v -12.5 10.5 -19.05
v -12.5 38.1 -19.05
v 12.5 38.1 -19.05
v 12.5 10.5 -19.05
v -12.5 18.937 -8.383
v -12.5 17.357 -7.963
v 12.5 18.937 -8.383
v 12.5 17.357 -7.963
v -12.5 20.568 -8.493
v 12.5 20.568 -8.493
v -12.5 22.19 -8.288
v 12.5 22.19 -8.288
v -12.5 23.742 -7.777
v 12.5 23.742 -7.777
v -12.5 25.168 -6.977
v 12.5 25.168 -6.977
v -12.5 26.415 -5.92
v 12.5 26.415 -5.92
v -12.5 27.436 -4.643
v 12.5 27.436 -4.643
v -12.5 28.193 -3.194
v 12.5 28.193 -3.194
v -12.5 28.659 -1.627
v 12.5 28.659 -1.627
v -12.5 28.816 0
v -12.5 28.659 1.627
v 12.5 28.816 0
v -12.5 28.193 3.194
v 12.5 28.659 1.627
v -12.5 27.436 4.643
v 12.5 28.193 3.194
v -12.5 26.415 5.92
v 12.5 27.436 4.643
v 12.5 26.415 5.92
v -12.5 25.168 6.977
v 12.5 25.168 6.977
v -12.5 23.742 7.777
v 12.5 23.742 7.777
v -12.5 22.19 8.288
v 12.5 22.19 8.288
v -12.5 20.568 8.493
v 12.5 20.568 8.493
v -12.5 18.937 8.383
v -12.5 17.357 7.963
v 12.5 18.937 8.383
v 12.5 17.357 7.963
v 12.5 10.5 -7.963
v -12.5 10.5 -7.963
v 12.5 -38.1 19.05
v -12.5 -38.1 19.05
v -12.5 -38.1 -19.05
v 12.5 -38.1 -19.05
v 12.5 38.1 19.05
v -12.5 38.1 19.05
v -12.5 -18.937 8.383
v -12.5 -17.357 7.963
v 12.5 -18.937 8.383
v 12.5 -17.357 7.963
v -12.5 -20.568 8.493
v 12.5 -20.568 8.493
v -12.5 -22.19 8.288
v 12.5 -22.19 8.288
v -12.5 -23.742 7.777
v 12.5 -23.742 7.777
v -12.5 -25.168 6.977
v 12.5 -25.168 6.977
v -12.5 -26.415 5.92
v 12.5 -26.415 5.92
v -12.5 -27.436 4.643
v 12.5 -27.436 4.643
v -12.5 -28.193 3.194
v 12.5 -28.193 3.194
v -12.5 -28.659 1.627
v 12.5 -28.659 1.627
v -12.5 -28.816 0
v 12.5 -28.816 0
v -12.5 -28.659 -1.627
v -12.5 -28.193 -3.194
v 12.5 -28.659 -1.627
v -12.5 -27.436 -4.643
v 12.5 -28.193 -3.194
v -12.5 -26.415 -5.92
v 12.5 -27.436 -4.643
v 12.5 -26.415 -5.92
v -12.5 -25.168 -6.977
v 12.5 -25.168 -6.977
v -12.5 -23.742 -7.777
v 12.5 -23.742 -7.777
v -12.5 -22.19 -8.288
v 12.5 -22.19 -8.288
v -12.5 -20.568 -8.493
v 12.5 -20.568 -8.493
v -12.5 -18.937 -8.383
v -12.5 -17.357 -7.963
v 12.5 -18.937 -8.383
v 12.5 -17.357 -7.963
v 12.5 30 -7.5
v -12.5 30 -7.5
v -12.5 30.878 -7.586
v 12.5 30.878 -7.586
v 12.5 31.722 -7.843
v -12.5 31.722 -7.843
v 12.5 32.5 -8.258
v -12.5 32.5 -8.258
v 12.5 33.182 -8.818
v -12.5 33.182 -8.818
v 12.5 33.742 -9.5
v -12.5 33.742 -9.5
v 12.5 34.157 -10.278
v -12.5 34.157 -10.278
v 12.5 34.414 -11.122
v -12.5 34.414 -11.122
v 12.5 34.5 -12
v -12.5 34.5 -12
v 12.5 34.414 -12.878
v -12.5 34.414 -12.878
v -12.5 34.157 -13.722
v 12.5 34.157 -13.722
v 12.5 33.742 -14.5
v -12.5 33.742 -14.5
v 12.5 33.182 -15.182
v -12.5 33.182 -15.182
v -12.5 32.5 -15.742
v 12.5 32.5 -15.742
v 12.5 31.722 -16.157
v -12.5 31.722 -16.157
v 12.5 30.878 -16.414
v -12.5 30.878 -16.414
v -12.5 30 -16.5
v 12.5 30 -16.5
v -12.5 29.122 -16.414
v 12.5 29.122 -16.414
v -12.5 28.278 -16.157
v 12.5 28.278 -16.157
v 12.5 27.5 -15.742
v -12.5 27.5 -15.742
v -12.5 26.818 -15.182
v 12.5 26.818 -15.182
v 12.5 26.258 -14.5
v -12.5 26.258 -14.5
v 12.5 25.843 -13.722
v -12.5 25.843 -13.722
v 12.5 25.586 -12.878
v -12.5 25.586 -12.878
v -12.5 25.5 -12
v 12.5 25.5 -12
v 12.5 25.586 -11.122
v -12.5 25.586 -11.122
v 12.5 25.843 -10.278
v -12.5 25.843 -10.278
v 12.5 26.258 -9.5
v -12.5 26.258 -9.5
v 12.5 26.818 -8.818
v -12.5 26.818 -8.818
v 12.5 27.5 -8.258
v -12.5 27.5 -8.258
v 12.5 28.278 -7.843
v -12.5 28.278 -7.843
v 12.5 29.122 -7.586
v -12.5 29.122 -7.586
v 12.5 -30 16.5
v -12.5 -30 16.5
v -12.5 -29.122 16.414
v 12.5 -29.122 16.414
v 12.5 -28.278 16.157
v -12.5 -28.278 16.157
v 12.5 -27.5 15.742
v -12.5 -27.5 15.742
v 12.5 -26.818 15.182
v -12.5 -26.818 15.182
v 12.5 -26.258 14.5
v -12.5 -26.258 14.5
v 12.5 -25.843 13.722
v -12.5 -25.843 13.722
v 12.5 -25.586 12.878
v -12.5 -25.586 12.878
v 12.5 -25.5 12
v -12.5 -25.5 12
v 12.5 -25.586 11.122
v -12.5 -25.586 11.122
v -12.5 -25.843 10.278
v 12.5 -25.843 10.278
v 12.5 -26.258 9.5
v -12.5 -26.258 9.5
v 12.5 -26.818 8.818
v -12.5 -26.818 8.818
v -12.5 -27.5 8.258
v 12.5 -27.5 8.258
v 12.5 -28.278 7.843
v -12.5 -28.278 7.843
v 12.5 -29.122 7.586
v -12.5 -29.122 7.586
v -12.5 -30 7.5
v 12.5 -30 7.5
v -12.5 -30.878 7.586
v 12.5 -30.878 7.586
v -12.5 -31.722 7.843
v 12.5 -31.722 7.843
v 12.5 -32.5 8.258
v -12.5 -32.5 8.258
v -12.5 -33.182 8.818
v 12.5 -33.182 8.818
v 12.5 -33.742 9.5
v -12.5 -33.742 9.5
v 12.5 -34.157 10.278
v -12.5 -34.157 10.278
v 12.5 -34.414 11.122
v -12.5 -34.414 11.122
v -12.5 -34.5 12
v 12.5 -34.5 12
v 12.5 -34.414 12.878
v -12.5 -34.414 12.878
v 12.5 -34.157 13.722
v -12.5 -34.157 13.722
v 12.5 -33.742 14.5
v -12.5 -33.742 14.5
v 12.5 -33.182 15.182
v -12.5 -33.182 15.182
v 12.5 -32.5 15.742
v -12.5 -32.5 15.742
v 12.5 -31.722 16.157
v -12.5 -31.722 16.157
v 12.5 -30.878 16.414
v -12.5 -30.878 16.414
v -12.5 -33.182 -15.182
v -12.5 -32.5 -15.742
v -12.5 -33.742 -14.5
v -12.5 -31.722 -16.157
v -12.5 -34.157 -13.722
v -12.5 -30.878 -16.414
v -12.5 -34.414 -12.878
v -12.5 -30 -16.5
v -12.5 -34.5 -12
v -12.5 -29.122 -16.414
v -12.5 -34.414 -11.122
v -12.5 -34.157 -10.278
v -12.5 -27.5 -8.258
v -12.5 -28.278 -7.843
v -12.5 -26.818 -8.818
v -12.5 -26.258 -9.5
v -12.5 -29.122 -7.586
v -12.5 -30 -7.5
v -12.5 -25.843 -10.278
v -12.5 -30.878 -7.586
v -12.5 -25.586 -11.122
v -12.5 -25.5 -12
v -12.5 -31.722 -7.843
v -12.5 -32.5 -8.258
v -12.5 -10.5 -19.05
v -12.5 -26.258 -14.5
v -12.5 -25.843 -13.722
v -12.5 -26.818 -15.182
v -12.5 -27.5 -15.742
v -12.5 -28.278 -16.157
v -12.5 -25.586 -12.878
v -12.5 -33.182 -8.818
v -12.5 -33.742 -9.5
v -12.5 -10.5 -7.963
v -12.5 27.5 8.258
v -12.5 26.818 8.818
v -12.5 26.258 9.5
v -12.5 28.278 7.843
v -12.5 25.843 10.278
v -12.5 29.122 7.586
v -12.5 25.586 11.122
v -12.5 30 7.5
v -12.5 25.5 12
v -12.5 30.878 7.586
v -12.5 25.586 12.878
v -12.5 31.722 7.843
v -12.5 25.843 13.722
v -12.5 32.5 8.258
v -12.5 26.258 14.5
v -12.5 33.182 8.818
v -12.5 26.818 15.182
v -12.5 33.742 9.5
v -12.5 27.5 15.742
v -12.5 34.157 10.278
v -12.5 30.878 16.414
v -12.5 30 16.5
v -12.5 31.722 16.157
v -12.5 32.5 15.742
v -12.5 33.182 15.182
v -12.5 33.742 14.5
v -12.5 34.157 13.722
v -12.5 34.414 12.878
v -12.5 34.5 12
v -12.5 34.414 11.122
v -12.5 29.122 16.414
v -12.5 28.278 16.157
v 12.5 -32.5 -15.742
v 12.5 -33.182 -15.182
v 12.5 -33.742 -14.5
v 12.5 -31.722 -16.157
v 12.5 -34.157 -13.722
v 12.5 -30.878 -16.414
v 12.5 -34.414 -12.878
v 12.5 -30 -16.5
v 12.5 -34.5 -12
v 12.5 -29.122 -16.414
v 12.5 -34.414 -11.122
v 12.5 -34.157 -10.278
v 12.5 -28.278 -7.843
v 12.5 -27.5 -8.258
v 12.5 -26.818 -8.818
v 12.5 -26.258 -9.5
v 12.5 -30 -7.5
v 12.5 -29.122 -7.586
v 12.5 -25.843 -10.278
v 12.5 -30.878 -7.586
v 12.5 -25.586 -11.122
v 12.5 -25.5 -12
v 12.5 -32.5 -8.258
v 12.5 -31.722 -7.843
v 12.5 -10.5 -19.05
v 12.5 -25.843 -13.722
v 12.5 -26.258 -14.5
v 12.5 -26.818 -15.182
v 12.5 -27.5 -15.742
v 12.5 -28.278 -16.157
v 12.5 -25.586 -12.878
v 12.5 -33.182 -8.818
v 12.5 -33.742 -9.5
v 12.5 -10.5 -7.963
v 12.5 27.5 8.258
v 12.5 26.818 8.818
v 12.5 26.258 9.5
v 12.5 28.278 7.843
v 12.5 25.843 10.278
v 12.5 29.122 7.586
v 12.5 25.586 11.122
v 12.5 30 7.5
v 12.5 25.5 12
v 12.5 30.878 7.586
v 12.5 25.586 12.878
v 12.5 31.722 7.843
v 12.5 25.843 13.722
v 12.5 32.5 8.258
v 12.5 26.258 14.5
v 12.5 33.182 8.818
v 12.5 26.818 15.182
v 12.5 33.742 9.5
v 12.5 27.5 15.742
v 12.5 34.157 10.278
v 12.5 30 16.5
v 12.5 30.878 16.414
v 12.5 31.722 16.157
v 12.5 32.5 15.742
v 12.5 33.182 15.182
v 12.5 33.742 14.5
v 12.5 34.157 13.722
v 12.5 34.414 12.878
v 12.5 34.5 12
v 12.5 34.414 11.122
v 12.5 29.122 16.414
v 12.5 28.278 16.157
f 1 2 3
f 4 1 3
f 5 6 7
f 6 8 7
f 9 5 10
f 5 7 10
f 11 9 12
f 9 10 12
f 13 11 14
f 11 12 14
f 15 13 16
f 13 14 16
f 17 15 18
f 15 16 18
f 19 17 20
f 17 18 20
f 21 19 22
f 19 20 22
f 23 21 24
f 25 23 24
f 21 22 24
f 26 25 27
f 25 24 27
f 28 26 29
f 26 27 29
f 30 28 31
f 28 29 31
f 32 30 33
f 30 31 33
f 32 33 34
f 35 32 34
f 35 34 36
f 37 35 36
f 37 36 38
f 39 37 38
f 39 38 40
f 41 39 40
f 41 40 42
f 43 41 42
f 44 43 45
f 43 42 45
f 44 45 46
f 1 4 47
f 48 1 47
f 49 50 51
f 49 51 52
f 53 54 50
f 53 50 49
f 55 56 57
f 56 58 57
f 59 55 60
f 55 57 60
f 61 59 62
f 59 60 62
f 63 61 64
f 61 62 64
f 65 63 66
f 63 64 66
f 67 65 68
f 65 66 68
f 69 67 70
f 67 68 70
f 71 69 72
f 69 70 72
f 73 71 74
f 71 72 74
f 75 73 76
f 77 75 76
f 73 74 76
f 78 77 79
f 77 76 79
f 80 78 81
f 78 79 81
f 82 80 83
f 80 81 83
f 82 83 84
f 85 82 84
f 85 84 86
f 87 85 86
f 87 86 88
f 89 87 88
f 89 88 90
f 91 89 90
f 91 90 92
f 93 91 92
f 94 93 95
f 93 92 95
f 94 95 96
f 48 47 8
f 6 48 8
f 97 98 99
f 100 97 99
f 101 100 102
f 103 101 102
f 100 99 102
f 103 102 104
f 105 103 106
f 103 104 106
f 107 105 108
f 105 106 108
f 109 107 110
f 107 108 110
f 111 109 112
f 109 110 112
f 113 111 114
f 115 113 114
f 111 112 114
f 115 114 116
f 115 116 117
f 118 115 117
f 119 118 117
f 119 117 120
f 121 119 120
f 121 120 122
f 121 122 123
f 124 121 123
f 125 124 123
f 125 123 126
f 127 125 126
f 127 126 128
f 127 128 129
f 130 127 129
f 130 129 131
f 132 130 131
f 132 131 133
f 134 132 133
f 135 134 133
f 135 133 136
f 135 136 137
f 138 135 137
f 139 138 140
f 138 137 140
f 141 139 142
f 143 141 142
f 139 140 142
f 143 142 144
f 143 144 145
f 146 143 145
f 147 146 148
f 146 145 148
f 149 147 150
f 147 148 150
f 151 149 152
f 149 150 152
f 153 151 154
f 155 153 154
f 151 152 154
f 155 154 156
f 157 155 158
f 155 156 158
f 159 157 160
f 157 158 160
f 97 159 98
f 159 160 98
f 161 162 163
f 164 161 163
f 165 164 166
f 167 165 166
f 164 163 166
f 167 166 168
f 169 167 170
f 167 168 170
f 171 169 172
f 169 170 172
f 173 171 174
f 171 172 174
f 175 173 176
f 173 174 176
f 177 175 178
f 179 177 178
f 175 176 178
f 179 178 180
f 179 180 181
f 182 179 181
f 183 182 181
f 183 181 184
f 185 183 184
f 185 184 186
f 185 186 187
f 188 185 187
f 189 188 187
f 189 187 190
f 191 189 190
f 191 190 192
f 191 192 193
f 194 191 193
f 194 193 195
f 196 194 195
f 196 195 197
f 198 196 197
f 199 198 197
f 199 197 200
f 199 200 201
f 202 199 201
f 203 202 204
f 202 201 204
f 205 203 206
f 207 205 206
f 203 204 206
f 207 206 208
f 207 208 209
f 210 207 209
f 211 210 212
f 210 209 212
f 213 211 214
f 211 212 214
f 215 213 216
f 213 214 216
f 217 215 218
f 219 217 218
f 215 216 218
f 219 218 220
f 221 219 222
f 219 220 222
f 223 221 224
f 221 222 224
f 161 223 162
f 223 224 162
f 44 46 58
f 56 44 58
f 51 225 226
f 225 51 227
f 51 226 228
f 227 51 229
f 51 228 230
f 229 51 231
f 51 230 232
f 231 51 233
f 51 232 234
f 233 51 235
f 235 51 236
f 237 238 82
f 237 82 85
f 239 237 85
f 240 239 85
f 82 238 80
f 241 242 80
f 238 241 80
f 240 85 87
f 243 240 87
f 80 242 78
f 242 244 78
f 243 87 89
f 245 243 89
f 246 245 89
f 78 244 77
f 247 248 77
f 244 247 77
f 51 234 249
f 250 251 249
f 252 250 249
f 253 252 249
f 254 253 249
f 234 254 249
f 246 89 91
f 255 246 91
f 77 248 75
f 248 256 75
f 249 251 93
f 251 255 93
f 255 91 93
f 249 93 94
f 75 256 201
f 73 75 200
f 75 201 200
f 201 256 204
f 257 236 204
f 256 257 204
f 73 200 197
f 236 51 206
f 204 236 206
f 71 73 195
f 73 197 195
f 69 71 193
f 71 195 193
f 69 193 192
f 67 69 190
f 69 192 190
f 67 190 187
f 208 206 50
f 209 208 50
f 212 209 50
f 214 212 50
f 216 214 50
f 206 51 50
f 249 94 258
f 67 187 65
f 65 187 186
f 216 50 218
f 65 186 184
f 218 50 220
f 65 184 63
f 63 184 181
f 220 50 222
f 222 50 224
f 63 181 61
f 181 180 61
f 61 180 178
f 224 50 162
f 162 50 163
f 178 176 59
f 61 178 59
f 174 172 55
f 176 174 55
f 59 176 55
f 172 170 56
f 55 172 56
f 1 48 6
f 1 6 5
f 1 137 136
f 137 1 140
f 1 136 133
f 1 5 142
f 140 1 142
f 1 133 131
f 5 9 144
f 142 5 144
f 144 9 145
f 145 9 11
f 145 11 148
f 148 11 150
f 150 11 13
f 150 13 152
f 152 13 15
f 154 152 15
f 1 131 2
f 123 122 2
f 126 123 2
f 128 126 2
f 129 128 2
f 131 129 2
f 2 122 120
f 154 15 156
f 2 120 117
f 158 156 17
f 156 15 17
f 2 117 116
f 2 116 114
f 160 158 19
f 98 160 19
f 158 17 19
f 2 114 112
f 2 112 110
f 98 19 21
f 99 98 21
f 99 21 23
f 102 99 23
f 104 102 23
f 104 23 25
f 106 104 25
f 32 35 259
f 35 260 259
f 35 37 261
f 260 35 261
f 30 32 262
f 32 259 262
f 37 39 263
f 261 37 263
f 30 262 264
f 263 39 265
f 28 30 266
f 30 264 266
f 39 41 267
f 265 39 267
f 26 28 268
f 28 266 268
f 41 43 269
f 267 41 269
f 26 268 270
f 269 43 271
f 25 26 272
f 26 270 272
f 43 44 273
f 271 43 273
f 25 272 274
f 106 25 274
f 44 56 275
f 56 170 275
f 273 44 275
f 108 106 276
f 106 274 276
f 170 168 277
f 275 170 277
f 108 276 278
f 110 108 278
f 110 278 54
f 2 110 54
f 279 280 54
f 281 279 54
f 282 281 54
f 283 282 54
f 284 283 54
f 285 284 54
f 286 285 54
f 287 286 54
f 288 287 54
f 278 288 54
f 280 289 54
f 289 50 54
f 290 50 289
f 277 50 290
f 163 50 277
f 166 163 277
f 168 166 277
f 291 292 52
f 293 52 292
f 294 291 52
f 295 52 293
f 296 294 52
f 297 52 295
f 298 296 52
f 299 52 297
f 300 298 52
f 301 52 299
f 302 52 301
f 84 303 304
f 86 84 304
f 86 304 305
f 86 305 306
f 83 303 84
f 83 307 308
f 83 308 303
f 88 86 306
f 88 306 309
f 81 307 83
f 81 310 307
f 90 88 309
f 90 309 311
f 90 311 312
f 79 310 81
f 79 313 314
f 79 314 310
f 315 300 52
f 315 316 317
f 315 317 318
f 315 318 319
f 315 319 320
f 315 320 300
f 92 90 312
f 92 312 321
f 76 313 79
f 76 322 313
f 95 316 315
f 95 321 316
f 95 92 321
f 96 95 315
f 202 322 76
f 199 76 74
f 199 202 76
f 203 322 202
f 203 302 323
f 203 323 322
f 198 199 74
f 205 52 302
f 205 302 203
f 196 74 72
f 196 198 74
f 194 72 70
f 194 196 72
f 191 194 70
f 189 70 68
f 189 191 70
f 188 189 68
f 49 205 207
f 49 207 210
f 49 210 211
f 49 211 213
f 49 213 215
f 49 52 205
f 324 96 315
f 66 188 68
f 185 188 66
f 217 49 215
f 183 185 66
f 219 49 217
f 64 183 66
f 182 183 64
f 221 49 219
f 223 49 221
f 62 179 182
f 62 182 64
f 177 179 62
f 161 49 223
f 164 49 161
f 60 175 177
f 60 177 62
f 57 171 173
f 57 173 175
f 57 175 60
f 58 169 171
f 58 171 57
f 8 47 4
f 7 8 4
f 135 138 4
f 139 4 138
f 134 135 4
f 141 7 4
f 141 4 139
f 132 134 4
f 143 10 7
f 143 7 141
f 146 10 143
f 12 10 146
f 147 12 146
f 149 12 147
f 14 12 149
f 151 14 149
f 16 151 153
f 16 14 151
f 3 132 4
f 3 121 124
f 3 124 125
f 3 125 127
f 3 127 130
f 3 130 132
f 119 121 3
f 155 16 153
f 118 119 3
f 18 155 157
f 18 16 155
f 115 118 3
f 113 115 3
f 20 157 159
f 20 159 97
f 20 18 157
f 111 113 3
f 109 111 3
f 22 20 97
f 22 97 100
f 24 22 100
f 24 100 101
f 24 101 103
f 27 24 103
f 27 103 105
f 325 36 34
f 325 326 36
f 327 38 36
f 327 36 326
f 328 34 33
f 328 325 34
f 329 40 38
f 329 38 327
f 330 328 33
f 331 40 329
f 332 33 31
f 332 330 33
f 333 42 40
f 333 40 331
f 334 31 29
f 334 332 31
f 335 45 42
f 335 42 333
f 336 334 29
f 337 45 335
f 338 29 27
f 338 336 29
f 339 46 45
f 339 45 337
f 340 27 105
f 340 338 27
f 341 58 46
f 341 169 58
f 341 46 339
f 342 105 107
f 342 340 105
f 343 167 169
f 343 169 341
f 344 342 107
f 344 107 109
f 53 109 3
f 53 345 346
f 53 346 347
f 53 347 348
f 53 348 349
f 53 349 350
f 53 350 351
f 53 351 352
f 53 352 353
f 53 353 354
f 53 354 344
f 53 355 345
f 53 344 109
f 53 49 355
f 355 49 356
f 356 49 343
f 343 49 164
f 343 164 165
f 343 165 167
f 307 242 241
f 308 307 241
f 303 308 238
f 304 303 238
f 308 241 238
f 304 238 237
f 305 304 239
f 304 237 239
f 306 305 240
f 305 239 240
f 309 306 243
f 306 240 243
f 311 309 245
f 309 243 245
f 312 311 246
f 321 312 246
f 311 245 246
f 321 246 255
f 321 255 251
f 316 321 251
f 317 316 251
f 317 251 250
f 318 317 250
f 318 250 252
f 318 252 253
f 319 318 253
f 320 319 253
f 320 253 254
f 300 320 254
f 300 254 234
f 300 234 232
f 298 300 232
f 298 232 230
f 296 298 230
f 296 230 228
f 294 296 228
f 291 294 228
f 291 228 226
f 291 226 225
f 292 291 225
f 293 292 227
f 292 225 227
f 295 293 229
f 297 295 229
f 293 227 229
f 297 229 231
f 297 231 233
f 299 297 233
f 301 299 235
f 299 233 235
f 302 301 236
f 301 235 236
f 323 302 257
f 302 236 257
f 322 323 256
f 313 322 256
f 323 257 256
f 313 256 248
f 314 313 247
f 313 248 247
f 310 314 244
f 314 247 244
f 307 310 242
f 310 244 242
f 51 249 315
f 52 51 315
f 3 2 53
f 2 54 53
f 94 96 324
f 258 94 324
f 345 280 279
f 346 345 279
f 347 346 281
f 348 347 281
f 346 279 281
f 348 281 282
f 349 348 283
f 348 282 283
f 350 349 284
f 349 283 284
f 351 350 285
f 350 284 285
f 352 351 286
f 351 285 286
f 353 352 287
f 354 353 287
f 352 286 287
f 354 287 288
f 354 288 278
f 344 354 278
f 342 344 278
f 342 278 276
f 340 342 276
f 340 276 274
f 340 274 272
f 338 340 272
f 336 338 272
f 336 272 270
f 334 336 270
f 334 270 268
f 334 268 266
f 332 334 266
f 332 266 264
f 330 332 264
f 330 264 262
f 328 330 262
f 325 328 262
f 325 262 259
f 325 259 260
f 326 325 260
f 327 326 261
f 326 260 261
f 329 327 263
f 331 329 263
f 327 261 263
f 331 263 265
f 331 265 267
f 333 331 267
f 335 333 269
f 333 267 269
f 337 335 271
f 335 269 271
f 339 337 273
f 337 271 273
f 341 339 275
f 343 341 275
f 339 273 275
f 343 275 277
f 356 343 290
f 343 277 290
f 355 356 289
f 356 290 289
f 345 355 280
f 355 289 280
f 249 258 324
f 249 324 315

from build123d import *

# Parameters (mm, degrees)
SKETCH1_W             = 25
SKETCH1_H             = 76.2
EXTRUDE1_DEPTH        = 19.05
M16_CLEARANCE_HOLE1_D = 16.9926
EXTRUDE3_DEPTH        = 50.39142132
M8_CLEARANCE_HOLE1_D  = 9


with BuildPart() as part:
    # Sketch1 → Extrude1 (new, symmetric)
    with BuildSketch(Plane.XY):
        Rectangle(SKETCH1_W, SKETCH1_H)
    extrude(amount=EXTRUDE1_DEPTH, both=True)

    # M16 Clearance Hole1 (through all)
    with Locations(Plane.ZY.offset(12.5)):
        with Locations((0, -20.32), (0, 20.32)):
            Hole(M16_CLEARANCE_HOLE1_D / 2)

    # Sketch2 → Extrude3 (cut, through all)
    with BuildSketch(Plane(origin=(12.5, 0, 0), x_dir=(0, 0, -1), z_dir=(1, 0, 0))):
        Polygon((19.05, 10.5), (7.9629, 10.5), (7.9629, 20), (-7.9629, 20), (-7.9629, -20), (7.9629, -20), (7.9629, -10.5), (19.05, -10.5), align=None)
    extrude(amount=-EXTRUDE3_DEPTH, mode=Mode.SUBTRACT)

    # M8 Clearance Hole1 (through all)
    with Locations(Plane(origin=(12.5, 0, 0), x_dir=(0, 0, -1), z_dir=(1, 0, 0))):
        with Locations((-12, 30), (12, 30), (12, -30), (-12, -30)):
            Hole(M8_CLEARANCE_HOLE1_D / 2)


solid = part.part
